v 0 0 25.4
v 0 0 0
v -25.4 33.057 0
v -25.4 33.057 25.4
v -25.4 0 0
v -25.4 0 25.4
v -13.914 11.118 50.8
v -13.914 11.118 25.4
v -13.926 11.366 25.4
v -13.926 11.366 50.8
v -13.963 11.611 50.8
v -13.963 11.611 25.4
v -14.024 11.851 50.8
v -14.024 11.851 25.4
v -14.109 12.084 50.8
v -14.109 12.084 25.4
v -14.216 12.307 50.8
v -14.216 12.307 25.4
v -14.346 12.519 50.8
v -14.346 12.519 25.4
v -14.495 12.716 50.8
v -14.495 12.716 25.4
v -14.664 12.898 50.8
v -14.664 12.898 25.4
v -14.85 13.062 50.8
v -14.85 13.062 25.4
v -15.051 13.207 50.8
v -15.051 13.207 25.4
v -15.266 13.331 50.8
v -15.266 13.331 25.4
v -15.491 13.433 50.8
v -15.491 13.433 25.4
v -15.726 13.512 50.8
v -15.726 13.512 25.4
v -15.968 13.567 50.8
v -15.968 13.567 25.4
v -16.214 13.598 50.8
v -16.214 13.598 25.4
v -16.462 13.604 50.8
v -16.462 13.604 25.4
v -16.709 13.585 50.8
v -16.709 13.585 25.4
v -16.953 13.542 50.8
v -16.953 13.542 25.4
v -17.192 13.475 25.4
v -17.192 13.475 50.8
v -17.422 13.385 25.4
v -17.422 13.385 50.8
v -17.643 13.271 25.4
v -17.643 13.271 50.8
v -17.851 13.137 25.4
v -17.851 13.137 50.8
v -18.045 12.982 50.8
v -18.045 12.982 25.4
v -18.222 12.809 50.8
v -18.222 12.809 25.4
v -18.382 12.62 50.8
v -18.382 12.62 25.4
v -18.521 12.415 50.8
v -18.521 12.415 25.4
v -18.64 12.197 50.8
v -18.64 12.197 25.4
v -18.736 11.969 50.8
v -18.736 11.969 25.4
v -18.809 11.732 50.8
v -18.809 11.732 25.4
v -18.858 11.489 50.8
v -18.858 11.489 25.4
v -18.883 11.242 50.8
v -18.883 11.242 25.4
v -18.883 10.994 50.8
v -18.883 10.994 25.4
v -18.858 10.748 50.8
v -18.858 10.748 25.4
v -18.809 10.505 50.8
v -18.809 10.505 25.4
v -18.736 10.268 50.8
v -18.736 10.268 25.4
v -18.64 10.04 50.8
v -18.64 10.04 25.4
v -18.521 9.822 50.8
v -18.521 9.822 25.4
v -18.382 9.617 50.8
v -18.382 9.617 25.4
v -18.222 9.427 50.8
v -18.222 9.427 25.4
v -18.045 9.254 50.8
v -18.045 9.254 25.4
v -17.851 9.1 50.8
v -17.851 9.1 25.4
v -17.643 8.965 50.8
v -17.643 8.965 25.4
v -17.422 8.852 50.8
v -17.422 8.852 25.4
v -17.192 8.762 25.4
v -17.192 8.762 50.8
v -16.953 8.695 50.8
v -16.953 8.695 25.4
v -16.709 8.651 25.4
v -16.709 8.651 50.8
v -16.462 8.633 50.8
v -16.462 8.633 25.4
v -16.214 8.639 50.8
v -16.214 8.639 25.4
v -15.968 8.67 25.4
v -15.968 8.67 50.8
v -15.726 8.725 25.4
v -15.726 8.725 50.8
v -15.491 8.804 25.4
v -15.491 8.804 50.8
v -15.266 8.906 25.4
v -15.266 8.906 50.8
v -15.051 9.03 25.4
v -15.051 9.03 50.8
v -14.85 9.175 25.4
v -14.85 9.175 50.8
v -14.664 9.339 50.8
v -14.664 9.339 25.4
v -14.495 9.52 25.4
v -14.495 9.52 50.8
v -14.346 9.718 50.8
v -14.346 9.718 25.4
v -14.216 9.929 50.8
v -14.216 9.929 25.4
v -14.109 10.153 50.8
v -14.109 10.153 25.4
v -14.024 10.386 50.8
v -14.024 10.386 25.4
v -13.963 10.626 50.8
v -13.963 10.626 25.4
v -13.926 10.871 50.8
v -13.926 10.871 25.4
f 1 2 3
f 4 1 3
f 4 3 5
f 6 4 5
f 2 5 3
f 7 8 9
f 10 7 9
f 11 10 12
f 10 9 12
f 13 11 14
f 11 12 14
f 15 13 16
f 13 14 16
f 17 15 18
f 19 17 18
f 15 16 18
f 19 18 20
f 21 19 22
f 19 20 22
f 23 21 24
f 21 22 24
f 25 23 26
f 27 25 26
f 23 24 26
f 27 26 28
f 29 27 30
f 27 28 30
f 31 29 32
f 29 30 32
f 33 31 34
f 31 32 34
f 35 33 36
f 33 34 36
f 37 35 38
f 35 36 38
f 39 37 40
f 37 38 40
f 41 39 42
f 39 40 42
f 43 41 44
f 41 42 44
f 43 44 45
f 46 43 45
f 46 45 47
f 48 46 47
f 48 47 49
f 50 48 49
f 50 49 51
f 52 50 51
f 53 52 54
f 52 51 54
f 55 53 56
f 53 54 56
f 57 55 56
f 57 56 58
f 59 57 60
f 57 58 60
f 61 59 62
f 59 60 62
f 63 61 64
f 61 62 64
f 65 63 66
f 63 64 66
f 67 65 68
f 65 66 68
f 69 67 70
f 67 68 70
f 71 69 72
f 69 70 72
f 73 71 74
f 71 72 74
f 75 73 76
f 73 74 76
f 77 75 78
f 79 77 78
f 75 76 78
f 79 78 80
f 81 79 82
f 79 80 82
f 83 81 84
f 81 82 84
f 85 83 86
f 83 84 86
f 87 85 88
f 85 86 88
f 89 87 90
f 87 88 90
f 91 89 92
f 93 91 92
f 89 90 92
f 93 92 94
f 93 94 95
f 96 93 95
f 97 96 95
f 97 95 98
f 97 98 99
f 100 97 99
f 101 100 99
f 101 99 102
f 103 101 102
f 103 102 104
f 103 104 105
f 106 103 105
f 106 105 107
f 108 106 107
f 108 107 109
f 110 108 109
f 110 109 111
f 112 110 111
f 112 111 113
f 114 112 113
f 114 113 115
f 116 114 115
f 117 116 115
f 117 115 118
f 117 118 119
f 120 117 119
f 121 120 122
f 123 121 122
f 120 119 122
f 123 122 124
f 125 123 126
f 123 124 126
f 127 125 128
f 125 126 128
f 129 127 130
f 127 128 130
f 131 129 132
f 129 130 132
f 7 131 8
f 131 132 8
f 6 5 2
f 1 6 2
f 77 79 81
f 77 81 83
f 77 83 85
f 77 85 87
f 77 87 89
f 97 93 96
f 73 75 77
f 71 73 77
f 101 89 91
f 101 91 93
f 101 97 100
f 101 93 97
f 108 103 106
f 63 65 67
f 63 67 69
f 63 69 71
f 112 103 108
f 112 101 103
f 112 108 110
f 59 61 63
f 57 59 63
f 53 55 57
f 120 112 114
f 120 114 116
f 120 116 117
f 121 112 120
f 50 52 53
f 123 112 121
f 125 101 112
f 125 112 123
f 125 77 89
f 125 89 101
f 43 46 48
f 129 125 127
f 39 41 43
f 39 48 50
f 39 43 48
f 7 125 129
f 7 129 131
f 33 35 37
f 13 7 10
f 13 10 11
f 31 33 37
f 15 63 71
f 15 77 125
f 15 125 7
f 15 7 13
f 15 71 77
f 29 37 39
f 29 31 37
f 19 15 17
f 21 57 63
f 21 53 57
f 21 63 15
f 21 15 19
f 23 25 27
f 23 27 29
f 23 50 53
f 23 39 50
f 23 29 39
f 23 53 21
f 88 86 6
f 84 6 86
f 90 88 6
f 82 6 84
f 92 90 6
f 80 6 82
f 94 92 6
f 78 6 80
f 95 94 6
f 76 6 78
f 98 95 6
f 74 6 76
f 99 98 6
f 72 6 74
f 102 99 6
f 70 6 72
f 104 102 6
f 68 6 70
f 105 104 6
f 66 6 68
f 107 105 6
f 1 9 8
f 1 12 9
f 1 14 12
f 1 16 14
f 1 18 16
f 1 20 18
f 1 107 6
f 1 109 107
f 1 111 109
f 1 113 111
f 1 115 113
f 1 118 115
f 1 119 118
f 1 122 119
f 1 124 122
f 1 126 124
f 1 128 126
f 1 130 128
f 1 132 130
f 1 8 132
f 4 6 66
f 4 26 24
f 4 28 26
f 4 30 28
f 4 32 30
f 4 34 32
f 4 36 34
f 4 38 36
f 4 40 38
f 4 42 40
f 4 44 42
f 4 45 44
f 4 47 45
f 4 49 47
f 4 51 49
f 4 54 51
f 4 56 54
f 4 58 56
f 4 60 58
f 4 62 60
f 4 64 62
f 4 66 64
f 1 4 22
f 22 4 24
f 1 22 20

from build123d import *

# Parameters (mm, degrees)
F1_DEPTH = 25.4
F2_R     = 2.486175
F3_DEPTH = 25.4


with BuildPart() as f1:
    # F0 (on Top) → F1 (new body)
    with BuildSketch(Plane.XY):
        Polygon((-25.4, 0), (0, 0), (-25.4, 33.05722), align=None)
    extrude(amount=F1_DEPTH)

    # F2 (on face) → F3 (join)
    with BuildSketch(Plane.XY.offset(25.4)):
        with Locations((-16.399799, 11.118355)):
            Circle(F2_R)
    extrude(amount=F3_DEPTH)


solid = f1.part
